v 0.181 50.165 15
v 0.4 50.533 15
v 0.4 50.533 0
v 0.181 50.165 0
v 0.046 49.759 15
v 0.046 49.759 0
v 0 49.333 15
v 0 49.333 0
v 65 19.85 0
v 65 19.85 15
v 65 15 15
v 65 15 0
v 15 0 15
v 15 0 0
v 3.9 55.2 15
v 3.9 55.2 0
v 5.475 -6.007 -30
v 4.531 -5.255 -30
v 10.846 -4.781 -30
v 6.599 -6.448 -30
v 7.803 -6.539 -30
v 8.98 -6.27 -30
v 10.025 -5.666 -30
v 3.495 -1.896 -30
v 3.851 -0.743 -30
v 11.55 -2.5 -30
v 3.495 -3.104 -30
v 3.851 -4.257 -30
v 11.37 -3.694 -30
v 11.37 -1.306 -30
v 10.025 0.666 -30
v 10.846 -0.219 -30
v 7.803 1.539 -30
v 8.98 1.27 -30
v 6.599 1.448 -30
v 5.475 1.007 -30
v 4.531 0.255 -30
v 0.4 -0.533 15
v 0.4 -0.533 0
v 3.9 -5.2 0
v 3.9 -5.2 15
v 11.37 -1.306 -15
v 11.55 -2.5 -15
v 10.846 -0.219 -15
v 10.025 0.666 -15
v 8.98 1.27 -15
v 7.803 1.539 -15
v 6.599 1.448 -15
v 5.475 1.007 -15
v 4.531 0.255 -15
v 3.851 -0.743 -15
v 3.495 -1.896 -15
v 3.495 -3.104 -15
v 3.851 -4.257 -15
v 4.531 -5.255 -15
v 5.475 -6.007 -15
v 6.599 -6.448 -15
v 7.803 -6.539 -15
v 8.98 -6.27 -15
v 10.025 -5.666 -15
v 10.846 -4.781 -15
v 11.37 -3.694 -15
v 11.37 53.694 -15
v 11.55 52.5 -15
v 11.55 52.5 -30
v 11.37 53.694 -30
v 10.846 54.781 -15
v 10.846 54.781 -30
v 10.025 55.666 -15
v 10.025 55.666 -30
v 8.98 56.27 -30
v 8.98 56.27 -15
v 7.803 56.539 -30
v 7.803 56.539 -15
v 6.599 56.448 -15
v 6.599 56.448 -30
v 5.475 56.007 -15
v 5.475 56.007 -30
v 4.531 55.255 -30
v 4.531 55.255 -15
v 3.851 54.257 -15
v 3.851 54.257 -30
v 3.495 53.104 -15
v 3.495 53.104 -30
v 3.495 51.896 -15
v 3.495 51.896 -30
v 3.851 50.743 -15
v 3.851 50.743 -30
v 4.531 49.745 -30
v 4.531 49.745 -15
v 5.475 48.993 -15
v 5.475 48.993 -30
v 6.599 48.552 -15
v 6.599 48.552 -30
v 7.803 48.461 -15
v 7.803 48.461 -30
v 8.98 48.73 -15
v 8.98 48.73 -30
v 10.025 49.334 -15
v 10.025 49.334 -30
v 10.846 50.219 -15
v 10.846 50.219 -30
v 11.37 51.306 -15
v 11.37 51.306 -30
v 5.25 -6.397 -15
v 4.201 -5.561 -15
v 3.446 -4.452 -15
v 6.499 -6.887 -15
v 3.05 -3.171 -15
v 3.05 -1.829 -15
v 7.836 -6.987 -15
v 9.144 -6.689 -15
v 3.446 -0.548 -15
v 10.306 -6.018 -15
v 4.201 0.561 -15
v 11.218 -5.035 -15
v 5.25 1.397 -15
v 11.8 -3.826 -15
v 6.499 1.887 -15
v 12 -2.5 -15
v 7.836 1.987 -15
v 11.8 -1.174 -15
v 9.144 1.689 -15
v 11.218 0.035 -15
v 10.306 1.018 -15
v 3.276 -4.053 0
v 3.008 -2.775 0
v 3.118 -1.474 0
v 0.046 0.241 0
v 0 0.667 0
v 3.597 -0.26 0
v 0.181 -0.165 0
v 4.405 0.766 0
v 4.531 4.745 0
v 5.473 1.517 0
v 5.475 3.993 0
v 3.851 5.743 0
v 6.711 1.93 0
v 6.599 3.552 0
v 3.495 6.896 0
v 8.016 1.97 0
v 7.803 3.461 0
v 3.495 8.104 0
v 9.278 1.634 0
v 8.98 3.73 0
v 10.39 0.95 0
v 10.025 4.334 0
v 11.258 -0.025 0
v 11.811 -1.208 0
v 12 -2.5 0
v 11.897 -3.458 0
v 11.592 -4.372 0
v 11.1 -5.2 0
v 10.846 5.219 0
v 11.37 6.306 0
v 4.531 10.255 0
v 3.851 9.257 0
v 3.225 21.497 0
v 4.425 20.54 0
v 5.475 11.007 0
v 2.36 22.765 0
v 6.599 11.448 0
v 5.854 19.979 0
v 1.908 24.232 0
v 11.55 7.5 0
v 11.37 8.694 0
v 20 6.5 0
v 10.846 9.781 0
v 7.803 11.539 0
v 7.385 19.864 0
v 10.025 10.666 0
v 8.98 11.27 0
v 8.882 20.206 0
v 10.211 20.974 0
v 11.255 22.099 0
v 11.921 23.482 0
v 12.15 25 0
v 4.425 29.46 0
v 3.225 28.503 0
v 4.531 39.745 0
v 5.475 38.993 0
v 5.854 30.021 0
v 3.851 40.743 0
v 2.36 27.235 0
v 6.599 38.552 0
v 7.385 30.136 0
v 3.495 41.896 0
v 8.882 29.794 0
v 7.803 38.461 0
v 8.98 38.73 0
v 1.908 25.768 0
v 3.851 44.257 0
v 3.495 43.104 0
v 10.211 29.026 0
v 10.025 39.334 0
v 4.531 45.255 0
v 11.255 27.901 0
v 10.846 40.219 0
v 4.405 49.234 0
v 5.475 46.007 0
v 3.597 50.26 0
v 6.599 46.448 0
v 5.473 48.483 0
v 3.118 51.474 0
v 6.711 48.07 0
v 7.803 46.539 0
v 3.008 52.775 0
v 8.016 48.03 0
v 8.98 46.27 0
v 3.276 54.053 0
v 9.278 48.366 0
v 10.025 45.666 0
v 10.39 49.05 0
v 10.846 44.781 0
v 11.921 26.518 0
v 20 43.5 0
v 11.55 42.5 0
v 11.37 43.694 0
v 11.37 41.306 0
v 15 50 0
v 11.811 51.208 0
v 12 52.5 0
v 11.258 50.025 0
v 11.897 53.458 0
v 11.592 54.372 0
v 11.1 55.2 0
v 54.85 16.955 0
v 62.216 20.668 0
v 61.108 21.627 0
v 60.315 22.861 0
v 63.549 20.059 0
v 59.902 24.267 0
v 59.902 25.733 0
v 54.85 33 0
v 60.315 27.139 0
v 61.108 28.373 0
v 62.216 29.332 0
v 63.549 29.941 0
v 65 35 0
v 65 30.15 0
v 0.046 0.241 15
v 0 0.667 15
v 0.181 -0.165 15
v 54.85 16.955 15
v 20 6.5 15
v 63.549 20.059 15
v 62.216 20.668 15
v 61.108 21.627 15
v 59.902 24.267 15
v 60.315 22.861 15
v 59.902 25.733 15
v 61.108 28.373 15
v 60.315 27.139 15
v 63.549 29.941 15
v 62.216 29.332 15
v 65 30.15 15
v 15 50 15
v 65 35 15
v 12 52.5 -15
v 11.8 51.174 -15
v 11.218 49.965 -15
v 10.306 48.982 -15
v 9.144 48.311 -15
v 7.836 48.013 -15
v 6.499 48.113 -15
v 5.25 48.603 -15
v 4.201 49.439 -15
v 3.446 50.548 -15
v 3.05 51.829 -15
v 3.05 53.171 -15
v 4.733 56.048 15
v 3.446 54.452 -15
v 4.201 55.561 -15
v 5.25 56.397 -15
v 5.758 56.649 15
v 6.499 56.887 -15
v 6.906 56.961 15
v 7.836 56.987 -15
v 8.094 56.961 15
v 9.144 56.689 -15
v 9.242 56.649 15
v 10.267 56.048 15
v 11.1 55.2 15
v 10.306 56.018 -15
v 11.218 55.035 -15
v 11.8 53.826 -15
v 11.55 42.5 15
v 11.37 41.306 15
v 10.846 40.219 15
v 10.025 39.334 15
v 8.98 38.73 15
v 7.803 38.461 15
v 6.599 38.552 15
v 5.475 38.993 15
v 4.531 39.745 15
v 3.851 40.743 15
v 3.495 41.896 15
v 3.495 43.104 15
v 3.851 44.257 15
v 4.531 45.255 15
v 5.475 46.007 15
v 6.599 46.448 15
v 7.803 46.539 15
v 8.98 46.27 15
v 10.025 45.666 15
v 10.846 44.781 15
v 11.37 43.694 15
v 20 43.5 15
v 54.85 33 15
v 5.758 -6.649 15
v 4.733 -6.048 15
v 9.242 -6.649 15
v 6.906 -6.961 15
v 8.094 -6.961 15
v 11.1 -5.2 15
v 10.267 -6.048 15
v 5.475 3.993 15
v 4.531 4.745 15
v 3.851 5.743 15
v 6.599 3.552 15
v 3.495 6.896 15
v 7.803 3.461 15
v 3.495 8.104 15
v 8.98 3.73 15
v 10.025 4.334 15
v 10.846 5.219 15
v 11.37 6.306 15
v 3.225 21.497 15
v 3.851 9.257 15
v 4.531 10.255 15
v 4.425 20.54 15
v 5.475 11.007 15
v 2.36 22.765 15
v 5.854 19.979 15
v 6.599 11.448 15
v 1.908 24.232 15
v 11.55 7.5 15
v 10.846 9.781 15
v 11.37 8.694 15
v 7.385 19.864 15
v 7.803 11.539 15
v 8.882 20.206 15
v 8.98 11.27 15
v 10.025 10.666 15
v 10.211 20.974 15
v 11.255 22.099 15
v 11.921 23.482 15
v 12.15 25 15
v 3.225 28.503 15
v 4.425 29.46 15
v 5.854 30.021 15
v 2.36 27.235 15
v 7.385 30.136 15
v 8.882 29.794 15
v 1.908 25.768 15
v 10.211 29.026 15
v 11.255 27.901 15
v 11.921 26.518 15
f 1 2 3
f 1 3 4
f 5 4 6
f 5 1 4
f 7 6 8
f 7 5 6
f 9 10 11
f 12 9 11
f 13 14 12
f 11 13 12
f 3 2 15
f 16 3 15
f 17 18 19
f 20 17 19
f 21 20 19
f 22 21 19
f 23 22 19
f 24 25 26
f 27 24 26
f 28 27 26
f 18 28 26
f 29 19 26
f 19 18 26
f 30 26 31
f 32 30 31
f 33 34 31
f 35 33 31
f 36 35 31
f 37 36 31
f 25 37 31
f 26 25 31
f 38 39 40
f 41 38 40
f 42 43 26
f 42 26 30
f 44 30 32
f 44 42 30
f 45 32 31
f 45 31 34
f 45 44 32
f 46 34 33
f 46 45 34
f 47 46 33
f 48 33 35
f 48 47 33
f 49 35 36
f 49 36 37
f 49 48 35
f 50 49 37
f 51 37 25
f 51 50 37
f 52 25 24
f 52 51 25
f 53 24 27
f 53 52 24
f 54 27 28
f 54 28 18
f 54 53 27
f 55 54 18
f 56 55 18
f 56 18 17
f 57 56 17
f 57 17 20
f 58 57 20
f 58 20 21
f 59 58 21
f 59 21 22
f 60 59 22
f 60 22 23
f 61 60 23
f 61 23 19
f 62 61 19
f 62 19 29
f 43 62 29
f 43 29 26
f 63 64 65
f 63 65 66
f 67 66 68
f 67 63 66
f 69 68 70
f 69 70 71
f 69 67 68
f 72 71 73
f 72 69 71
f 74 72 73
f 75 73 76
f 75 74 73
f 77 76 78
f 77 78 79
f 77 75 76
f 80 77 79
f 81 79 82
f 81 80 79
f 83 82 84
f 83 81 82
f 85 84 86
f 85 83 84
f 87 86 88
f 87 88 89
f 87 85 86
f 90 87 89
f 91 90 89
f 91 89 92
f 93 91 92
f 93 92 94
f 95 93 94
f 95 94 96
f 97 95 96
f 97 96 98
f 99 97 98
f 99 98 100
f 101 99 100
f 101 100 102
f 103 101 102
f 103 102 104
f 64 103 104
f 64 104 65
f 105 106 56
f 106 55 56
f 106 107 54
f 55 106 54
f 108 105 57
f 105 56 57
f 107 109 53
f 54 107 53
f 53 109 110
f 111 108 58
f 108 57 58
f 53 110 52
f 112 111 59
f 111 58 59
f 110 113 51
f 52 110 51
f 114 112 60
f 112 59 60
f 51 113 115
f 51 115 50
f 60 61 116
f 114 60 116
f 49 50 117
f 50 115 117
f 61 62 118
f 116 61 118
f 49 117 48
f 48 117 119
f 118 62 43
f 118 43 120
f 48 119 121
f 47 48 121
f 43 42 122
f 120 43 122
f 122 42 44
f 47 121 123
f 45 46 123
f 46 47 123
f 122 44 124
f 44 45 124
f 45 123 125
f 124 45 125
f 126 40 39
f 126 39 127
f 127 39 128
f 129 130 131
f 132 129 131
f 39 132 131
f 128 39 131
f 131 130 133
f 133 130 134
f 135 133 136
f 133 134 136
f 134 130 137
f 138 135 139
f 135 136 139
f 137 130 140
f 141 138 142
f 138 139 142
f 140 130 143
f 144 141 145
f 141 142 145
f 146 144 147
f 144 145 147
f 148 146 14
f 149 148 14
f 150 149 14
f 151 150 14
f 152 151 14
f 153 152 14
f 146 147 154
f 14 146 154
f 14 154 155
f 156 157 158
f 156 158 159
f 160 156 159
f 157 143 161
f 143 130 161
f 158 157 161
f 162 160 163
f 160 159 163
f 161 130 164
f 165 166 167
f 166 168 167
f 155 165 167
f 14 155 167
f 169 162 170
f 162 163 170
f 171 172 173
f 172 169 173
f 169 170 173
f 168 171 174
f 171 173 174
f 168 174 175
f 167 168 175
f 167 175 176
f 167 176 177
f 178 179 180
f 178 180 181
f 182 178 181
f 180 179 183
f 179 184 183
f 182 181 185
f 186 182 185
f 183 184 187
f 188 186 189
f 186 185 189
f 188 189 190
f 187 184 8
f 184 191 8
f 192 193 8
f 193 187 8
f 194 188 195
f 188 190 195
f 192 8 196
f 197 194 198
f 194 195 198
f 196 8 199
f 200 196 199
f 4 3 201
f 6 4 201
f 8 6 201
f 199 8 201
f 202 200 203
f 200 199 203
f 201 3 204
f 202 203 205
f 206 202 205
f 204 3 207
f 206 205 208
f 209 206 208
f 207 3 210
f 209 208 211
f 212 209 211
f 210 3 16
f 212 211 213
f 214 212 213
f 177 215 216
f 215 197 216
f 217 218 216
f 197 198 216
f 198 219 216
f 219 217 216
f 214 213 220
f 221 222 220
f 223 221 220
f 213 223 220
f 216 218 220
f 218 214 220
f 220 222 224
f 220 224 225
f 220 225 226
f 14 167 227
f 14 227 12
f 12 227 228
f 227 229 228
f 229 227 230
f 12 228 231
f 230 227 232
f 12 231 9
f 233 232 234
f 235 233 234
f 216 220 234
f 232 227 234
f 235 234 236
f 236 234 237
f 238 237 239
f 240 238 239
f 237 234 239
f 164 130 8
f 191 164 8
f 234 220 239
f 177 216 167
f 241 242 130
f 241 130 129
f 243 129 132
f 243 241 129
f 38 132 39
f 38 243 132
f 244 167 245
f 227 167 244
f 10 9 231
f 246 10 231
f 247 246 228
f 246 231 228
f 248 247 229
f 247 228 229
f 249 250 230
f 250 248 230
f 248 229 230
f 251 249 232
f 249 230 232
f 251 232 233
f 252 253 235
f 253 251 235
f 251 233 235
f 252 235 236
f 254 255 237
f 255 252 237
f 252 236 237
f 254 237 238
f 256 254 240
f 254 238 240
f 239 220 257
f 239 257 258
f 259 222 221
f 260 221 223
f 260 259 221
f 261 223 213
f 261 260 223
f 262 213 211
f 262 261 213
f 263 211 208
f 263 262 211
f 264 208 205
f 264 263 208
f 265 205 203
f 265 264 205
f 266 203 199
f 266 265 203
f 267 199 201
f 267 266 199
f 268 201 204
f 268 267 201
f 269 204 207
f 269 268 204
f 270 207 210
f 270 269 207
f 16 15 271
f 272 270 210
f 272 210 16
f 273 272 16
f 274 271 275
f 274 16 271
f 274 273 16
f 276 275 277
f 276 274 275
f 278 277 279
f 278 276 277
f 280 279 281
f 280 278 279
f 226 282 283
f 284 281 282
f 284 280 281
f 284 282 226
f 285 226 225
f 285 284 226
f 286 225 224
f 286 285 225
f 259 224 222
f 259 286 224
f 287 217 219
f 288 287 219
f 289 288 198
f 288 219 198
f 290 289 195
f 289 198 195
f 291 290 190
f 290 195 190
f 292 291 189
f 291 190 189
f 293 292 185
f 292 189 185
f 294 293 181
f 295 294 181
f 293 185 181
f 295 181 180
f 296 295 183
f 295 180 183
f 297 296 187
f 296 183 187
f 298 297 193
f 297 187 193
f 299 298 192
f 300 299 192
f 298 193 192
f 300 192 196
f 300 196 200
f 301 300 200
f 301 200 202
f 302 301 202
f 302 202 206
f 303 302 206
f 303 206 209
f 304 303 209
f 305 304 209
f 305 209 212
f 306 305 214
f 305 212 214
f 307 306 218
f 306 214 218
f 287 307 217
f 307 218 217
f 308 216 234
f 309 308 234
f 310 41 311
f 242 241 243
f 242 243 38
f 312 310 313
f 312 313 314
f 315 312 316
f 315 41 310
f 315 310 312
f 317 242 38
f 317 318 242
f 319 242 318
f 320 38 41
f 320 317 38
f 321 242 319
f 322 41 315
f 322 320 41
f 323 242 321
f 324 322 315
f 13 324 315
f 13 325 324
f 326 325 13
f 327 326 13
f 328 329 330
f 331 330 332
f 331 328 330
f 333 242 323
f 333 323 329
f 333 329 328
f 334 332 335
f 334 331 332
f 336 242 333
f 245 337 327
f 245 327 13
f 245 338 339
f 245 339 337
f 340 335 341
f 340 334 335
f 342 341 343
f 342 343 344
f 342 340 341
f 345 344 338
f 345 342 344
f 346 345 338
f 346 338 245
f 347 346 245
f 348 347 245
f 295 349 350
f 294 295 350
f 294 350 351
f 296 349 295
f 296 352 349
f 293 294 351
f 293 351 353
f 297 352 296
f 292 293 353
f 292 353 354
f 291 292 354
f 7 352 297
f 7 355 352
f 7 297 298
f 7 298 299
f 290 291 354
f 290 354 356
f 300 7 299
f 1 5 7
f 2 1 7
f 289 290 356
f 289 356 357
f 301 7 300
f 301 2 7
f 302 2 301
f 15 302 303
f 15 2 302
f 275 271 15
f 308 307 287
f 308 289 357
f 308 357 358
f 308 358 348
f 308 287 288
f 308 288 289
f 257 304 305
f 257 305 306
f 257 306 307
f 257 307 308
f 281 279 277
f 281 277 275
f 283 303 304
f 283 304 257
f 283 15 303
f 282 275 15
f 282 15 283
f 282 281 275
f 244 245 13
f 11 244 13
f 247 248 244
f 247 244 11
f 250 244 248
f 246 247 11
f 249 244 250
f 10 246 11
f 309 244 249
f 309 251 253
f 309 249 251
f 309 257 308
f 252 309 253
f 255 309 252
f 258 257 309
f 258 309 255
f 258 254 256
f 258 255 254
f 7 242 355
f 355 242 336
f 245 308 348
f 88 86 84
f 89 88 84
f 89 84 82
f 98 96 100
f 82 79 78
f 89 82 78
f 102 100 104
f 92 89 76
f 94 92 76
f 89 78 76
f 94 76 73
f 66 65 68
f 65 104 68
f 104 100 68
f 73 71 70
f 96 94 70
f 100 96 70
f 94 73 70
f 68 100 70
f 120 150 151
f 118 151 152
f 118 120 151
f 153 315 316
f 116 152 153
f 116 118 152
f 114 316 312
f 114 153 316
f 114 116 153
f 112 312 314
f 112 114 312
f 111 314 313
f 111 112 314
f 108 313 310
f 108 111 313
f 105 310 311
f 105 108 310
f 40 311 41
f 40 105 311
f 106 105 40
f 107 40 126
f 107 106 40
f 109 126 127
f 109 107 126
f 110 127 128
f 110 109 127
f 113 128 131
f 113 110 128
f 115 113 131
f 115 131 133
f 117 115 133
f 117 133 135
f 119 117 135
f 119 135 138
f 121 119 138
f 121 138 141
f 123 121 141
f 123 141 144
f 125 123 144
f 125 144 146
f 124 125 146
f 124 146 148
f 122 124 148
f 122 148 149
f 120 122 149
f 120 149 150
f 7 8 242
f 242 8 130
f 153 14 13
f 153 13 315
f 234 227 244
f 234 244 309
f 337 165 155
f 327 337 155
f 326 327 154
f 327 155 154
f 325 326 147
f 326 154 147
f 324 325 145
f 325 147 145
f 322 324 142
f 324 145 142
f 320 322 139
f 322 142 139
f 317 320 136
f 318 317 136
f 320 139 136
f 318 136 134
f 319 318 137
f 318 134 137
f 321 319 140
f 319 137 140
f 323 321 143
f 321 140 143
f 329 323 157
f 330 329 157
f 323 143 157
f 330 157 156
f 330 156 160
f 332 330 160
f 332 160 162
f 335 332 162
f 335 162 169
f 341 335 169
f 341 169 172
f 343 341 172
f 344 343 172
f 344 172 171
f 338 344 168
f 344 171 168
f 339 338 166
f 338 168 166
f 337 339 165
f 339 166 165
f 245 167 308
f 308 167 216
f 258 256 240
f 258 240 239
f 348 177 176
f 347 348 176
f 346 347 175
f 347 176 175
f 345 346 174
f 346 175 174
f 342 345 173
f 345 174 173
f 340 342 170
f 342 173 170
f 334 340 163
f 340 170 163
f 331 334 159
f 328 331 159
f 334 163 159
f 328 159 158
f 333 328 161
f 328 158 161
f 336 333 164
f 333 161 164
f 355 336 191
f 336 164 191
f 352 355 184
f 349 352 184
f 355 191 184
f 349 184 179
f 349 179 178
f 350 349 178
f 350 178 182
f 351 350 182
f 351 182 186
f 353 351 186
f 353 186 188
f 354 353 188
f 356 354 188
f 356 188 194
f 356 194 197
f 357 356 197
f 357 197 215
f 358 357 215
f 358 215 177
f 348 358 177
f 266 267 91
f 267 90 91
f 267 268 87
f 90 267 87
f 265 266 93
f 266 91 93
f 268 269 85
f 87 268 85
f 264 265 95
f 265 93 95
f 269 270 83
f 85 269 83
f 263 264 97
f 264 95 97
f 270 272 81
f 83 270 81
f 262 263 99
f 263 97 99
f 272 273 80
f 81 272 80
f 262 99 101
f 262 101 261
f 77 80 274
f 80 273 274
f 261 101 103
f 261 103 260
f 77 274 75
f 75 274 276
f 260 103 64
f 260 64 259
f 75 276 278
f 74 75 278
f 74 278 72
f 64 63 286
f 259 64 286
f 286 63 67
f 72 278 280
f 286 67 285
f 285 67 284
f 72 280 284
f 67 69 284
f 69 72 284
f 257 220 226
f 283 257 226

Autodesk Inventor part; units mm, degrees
ref_plane "YZ Plane" through (0, 0, 0) normal (1, 0, 0) x (0, 1, 0)
ref_plane "XZ Plane" through (0, 0, 0) normal (0, 1, 0) x (-1, 0, 0)
ref_plane "XY Plane" through (0, 0, 0) normal (0, 0, 1) x (1, 0, 0)
sketch "Sketch1" plane through (0, 0, 0) normal (0, 0, 1) x (1, 0, 0)
  arc A0 (65, 30.15) -> (65, 19.85) centre (65, 25) ccw
  line L0 (65, 30.15) -> (65, 35)
  line L1 (65, 19.85) -> (65, 15)
  line L2 (65, 25) -> (15, 25)
  line L3 (15, 25) -> (15, 50)
  line L4 (15, 25) -> (15, 0)
  line L5 (15, 0) -> (65, 15)
  line L6 (15, 50) -> (65, 35)
  line L7 (15, 50) -> (0, 50)
  line L8 (0, 50) -> (0, 0)
  line L9 (0, 0) -> (15, 0)
  line L10 (15, 25) -> (20, 25)
  line L11 (20, 25) -> (20, 48.5)
  line L12 (20, 25) -> (20, 1.5)
  line L13 (59.85, 25) -> (54.85, 25)
  line L14 (54.85, 25) -> (54.85, 38.045)
  line L15 (54.85, 25) -> (54.85, 11.955)
  line L16 (20, 1.5) -> (20, 6.5)
  line L17 (20, 6.5) -> (54.85, 16.955)
  line L18 (20, 48.5) -> (20, 43.5)
  line L19 (20, 43.5) -> (54.85, 33)
  line L20 (7.5, 50) -> (7.5, 0)
  line L21 (0, 25) -> (15, 25)
  line L22 (0, 50) -> (15, 35)
  line L23 (0, 50) -> (21.2132, 50) construction
  line L24 (0, 0) -> (15, 15)
  line L25 (0, 0) -> (21.2132, 0) construction
  circle A1 centre (7.5, 7.5) radius 4.05
  circle A2 centre (7.5, 42.5) radius 4.05
  line L26 (65, 19.85) -> (65, 25)
  line L27 (65, 30.15) -> (65, 25)
  line L28 (7.5, 25) -> (7, 25)
  circle A3 centre (7, 25) radius 5.15
  line L29 (0, 50) -> (15, 50)
  line L30 (15, 50) -> (15, 60)
  line L31 (15, 60) -> (0, 60)
  line L32 (0, 60) -> (0, 50)
  line L33 (15, 0) -> (0, 0)
  line L34 (0, 0) -> (0, -10)
  line L35 (0, -10) -> (15, -10)
  line L36 (15, -10) -> (15, 0)
  line L37 (7.5, -10) -> (7.5, -2.5)
  line L38 (7.5, 60) -> (7.5, 52.5)
  circle A4 centre (7.5, 52.5) radius 4.05
  circle A5 centre (7.5, 52.5) radius 4.5
  circle A6 centre (7.5, -2.5) radius 4.05
  circle A7 centre (7.5, -2.5) radius 4.5
  line L39 (0, 50) -> (3.9, 55.2)
  line L40 (15, 50) -> (11.1, 55.2)
  line L41 (0, 0) -> (3.9, -5.2)
  line L42 (15, 0) -> (11.1, -5.2)
  point P0 (0, 0)
  point P1 (3.7583, 0)
  point P2 (11.2417, 0)
  point P3 (11.2417, 50)
  point P4 (3.7583, 50)
  point P5 (0, 0)
  dimension "d0" = 10.3
  dimension "d1" = 50
  dimension "d2" = 25
  dimension "d3" = 25
  dimension "d4" = 15
  dimension "d5" = 50
  dimension "d6" = 90
  dimension "d7" = 5
  dimension "d8" = 5
  dimension "d9" = 5
  dimension "d10" = 5
  dimension "d11" = 45
  dimension "d12" = 45
  dimension "d13" = 8.1
  dimension "d14" = 8.1
  dimension "d15" = 50
  dimension "d16" = 10
  dimension "d17" = 20
  dimension "d18" = 10
  dimension "d19" = 5.045
  dimension "d46" = 0.5
  dimension "d47" = 10.3
  dimension "d48" = 15
  dimension "d49" = 10
  dimension "d50" = 15
  dimension "d51" = 10
  dimension "d52" = 7.5
  dimension "d53" = 7.5
  dimension "d54" = 8.1
  dimension "d55" = 9
  dimension "d56" = 8.1
  dimension "d57" = 9
extrude "Extrusion1" add sketch "Sketch1" along normal blind 15 contours A0 L2 L14 L6 L0 | A0 L1 L5 L15 L2 | L14 L19 L11 L6 | L12 L5 L4 L2 | L2 L3 L6 L11 | L15 L5 L12 L17 | L21 A3 L20 A2 L22 L3 | L4 L24 A1 L20 A3 L21 | L3 L22 A2 L20 A5 L7 | L7 A5 L40 | L4 L9 A7 L20 A1 L24 | A5 L20 A4 L7 | L7 A4 L38 A5 | L42 A7 L9 | A3 L21 L8 L22 A2 L20 | L20 A1 L24 L8 L21 A3 | A4 L20 L7 | L7 A4 | A5 L7 A4 L20 | L20 A2 L22 L7 A5 | L38 A4 L7 A5 | A7 L37 A6 L9 | L9 A6 L20 A7 | L20 A4 L7 | L7 L39 A5 | A6 L9 | L9 L20 A6 | A7 L9 L24 A1 L20 | L20 A6 L9 A7 | A7 L9 A6 L37 | L9 A6 L20 | A7 L41 L9
extrude "Extrusion2" add sketch "Sketch1" against normal blind 15 contours A5 L20 A4 L7 | L7 A4 L38 A5 | A4 L20 L7 | L7 A4 | A5 L7 A4 L20 | L38 A4 L7 A5 | A7 L37 A6 L9 | L9 A6 L20 A7 | L20 A4 L7 | A6 L9 | L9 L20 A6 | L20 A6 L9 A7 | A7 L9 A6 L37 | L9 A6 L20
extrude "Extrusion3" add sketch "Sketch1" against normal blind 30 contours A4 L20 L7 | L7 A4 | L20 A4 L7 | A6 L9 | L9 L20 A6 | L9 A6 L20
fillet "Fillet1" radius 2 2 edges at (0, 0, 7.5) (0, 50, 7.5)
properties part number "Rod_support_2"
